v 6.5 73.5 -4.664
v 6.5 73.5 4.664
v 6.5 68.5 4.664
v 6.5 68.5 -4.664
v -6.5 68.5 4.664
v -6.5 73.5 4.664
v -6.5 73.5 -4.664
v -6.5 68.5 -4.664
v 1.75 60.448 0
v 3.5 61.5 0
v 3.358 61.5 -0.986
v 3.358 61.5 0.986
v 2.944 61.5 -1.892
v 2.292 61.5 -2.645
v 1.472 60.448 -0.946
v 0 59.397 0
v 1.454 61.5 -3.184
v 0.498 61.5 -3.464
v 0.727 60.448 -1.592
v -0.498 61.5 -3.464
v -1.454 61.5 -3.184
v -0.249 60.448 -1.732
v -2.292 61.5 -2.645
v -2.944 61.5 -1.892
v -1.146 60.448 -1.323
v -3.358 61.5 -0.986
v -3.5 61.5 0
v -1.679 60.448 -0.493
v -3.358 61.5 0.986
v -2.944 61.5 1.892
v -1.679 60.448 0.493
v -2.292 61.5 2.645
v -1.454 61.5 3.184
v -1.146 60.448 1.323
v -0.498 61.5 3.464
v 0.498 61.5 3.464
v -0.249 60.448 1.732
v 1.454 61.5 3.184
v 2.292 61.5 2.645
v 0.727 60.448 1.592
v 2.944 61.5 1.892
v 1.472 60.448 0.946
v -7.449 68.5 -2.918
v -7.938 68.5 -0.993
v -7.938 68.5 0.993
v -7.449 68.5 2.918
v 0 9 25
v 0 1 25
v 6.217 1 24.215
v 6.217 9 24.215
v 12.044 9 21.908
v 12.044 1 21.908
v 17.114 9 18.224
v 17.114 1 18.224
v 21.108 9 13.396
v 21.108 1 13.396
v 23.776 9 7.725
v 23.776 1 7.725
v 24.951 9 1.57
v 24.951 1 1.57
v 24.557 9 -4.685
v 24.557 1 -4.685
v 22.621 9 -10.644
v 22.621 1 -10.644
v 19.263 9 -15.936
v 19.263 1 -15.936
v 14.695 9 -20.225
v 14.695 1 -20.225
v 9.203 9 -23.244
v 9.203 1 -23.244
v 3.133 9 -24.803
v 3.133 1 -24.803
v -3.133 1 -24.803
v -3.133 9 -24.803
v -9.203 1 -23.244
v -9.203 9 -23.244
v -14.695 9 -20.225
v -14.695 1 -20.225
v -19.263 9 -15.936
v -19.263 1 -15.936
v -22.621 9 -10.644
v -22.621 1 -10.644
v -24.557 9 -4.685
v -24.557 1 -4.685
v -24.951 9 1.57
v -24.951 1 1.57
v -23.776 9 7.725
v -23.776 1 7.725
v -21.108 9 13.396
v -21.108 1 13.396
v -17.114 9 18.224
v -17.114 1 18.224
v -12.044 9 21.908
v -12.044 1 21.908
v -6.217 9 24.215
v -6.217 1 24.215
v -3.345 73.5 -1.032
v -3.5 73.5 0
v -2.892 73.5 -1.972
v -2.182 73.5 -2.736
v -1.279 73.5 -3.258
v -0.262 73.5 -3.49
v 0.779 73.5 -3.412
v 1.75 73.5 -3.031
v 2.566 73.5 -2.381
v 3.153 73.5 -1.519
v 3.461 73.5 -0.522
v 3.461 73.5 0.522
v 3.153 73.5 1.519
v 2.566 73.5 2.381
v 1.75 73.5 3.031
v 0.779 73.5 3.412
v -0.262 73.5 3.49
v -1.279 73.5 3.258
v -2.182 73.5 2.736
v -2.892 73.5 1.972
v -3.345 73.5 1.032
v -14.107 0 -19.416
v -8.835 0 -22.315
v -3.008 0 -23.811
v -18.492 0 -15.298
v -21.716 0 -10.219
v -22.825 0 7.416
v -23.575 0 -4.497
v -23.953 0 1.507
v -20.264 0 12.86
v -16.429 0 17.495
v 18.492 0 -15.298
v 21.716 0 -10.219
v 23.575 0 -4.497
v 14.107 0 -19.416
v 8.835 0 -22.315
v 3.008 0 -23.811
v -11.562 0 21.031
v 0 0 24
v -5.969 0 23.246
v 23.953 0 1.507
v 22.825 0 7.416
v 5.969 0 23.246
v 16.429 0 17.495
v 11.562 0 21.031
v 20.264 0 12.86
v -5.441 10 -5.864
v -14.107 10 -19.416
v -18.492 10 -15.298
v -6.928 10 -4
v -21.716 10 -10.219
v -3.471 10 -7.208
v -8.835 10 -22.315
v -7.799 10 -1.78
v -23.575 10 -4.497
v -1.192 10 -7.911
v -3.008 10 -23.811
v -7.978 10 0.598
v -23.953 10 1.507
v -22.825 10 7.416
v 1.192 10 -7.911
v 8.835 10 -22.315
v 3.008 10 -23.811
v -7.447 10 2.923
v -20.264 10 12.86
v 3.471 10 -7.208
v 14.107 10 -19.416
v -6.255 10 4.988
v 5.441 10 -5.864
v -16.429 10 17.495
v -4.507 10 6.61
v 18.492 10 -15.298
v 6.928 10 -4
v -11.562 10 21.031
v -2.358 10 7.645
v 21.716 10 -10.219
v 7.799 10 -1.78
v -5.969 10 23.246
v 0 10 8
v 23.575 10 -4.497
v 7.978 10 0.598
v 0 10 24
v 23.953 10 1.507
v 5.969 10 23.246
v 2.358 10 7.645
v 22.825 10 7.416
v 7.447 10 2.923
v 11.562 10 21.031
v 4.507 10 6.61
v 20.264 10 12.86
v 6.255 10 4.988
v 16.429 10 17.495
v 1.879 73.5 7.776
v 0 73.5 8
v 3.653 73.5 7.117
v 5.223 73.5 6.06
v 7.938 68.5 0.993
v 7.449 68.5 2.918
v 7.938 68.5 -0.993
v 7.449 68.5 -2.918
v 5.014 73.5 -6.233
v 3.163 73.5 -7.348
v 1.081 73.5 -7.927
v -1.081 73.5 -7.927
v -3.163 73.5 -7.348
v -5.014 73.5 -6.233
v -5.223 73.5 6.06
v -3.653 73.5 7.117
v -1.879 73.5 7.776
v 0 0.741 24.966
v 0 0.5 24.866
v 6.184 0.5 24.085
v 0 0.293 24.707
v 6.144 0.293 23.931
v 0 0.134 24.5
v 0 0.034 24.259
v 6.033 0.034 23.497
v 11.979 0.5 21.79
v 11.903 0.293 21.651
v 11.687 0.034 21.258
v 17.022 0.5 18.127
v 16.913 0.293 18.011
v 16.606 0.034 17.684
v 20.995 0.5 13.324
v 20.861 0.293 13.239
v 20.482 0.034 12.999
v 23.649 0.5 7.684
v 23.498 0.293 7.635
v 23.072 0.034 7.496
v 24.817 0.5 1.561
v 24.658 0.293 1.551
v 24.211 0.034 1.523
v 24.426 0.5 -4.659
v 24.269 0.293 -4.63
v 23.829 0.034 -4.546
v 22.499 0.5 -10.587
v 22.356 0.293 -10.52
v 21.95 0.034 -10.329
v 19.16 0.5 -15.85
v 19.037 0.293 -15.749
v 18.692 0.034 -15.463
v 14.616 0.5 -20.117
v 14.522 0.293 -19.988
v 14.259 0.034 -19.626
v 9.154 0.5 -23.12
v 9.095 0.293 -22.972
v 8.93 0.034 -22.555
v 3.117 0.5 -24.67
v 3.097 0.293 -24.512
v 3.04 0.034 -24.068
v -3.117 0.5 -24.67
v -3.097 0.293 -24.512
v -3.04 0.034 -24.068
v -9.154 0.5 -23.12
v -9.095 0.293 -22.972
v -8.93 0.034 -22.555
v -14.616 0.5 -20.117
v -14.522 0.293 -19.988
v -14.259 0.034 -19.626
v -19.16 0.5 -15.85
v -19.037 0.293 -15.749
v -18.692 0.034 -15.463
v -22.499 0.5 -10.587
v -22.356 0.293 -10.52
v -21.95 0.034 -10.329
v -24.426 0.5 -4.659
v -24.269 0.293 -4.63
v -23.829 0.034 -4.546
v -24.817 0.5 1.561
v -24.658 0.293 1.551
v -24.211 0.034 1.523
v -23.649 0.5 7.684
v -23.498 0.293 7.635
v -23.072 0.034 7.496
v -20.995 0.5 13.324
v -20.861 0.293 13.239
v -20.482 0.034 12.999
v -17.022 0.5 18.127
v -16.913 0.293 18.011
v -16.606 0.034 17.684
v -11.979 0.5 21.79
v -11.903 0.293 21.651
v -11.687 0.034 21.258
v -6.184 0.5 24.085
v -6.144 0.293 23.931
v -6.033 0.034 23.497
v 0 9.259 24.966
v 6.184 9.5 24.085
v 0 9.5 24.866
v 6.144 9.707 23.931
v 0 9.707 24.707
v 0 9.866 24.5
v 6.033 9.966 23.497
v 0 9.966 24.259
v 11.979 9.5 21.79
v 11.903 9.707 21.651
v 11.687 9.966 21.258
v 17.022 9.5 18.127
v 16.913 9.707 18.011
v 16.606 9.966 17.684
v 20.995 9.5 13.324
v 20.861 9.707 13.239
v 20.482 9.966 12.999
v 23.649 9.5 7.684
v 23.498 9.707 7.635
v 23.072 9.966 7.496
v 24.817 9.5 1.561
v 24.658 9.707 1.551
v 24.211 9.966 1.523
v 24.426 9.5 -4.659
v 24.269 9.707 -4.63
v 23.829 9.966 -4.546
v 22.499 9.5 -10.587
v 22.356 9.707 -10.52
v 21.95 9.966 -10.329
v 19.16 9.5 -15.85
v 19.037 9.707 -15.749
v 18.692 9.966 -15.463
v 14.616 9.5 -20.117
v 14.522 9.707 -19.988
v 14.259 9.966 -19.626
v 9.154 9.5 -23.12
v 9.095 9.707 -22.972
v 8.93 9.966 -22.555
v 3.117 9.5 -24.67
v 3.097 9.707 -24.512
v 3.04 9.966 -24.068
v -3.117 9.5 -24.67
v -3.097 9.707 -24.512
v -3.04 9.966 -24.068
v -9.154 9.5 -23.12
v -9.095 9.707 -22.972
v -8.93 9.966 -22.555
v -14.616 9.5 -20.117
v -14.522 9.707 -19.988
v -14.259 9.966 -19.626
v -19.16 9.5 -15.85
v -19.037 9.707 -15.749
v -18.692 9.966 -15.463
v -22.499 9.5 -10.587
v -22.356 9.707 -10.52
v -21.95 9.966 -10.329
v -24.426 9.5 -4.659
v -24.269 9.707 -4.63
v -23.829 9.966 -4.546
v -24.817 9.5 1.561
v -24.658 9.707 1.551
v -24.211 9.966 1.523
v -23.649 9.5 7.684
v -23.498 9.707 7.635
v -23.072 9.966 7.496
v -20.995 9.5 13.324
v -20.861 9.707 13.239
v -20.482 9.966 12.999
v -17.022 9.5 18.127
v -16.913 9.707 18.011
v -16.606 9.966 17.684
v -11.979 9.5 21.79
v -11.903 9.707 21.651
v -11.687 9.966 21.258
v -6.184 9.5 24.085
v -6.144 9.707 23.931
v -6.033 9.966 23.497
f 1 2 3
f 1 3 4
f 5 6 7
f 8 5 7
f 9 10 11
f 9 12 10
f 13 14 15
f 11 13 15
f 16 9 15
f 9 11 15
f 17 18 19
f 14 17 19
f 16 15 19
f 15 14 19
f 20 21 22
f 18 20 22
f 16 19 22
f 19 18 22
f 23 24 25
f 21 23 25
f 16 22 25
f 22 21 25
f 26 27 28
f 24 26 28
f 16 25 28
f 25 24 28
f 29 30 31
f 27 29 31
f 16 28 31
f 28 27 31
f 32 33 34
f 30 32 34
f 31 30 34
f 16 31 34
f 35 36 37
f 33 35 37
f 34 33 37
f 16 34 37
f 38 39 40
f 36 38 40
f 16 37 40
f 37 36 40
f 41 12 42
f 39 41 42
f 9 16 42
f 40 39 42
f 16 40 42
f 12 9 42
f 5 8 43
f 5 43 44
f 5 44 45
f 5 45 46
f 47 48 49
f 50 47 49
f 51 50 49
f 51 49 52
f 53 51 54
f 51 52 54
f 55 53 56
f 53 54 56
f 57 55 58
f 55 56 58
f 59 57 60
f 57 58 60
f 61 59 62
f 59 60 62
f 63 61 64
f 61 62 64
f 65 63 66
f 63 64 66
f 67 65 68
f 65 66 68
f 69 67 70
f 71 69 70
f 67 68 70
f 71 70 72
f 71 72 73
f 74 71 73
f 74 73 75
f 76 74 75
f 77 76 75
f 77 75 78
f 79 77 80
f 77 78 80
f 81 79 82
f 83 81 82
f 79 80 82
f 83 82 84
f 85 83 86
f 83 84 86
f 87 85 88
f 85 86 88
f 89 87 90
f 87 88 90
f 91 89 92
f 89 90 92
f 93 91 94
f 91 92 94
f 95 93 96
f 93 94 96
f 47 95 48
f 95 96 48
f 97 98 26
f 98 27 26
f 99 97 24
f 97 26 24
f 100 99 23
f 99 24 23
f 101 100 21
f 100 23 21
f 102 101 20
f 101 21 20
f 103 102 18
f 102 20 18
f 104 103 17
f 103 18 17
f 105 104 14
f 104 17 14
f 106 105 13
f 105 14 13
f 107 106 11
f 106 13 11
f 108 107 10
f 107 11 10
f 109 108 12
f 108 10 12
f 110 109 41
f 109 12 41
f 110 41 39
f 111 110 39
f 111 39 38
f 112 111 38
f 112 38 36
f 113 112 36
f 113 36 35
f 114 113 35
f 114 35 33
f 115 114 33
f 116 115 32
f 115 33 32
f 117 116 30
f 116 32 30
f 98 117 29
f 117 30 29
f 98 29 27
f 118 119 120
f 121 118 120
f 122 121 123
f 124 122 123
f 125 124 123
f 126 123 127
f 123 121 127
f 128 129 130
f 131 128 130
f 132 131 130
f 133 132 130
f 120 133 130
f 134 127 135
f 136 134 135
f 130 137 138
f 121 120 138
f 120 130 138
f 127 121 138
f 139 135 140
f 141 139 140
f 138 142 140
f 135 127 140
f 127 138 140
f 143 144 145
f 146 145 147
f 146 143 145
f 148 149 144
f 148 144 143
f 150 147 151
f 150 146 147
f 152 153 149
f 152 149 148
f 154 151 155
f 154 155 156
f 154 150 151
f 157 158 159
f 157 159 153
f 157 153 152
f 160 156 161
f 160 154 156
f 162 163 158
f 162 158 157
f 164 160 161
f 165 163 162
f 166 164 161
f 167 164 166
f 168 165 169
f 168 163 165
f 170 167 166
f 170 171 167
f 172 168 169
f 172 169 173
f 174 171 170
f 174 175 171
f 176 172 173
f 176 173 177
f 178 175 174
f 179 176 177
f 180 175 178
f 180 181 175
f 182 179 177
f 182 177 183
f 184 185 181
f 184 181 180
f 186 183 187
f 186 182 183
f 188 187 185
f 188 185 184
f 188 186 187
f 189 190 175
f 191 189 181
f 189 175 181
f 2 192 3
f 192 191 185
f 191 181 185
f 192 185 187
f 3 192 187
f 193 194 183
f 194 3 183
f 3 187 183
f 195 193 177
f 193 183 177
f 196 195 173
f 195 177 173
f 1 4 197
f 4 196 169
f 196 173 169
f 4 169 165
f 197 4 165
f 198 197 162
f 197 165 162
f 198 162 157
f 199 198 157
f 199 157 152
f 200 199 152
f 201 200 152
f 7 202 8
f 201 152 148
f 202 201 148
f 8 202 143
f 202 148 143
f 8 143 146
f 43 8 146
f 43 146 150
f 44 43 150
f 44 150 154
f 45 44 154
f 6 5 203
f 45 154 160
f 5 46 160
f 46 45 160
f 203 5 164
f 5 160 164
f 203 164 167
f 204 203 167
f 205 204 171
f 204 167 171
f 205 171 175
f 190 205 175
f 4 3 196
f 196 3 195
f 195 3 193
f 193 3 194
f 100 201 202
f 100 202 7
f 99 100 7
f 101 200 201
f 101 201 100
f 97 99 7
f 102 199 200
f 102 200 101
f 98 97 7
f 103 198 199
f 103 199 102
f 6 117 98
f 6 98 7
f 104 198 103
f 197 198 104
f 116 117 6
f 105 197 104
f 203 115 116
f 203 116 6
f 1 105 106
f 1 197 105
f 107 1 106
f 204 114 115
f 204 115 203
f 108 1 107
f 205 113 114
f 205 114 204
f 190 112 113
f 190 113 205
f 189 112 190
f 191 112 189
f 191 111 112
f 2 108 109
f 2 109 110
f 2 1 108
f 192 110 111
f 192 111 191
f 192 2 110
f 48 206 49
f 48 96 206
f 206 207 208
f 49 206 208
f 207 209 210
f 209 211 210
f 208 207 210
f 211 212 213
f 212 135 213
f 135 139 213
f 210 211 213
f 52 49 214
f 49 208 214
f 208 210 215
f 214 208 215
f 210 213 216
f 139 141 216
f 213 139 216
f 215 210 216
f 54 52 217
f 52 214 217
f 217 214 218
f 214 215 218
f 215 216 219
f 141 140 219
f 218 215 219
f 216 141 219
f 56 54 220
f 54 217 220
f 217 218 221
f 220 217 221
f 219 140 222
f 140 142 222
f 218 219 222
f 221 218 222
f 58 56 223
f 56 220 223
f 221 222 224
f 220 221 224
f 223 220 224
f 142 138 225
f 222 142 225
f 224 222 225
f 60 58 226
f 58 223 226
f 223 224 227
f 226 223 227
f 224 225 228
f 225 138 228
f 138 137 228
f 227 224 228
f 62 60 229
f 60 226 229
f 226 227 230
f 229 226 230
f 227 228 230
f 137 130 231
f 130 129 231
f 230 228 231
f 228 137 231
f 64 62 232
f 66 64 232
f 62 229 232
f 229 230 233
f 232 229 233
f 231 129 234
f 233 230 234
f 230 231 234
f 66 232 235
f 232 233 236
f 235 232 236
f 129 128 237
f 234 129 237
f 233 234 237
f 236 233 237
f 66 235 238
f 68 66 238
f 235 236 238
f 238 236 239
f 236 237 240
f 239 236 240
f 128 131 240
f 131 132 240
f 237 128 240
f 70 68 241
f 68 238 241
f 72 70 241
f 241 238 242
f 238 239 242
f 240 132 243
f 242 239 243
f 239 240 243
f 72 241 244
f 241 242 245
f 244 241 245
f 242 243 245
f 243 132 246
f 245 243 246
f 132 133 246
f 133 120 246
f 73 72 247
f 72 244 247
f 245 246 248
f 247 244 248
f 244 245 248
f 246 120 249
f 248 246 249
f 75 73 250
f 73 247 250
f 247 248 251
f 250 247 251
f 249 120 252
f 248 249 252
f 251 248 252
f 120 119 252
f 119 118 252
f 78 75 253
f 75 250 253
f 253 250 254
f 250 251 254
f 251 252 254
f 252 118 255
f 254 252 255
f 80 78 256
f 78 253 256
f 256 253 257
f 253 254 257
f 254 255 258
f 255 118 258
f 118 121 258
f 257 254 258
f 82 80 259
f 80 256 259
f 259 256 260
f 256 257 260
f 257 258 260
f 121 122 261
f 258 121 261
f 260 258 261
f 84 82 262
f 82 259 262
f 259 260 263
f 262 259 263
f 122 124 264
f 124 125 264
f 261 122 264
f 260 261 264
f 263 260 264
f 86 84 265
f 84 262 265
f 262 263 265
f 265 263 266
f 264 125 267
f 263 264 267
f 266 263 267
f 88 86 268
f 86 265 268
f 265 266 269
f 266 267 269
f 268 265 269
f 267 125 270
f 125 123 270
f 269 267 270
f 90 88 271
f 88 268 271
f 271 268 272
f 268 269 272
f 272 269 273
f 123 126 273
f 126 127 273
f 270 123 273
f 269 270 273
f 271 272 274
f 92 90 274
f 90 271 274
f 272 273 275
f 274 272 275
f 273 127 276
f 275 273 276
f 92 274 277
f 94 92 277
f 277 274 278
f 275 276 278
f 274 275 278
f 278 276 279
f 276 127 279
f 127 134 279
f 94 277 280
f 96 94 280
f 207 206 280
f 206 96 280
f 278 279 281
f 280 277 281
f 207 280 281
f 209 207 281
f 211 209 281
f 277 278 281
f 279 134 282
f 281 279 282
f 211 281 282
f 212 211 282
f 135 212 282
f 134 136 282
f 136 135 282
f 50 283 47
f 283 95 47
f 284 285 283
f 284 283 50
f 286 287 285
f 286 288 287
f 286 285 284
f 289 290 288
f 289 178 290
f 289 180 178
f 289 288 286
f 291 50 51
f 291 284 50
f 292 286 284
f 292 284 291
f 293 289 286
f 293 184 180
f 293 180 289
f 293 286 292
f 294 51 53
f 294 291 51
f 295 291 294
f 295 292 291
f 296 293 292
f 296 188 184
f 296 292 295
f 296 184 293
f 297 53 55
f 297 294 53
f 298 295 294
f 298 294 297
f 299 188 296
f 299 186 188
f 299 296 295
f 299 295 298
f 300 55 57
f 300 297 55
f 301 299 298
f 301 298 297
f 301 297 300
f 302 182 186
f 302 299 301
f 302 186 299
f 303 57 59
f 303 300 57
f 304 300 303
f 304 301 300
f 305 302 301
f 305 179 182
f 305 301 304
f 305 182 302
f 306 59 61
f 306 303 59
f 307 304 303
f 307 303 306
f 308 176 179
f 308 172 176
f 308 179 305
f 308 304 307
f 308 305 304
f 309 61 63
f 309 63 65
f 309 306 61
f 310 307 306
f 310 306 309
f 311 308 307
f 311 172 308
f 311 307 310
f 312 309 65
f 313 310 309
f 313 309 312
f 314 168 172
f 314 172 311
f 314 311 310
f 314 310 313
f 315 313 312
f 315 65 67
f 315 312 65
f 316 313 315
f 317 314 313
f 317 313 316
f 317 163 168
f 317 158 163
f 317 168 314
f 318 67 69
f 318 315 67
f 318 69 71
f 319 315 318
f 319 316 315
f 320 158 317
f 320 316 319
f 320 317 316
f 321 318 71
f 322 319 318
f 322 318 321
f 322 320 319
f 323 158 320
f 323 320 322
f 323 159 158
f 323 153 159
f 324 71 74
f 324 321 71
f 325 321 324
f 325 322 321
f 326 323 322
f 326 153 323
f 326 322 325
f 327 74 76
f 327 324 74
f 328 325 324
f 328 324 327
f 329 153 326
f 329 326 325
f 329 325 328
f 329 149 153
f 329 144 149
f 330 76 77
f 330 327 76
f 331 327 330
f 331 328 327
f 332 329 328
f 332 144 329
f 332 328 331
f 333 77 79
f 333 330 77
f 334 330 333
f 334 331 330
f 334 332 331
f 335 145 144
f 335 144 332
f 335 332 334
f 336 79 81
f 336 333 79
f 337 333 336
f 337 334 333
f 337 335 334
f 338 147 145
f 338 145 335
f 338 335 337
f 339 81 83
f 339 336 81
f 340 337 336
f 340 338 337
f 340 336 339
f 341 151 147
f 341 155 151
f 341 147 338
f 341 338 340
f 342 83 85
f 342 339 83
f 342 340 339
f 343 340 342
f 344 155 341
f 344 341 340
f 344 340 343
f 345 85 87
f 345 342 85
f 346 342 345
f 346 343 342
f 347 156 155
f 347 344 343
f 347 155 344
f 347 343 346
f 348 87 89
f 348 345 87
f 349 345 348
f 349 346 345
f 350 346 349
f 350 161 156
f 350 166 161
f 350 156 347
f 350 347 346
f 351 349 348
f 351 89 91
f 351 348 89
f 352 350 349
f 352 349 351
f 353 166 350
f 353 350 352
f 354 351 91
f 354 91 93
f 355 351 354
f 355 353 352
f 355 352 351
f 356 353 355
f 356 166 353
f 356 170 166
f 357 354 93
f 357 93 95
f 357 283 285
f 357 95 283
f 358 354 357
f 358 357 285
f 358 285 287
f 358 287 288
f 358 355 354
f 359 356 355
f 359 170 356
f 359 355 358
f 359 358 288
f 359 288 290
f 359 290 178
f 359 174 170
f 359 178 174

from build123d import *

# Parameters (mm, degrees)
SKETCH1_R                 = 25
BOSS_EXTRUDE1_DEPTH       = 10
FILLET1_R                 = 1
SKETCH2_R                 = 8
BOSS_EXTRUDE2_DEPTH       = 63.5
M8X1_0_TAPPED_HOLE1_D     = 7
M8X1_0_TAPPED_HOLE1_DEPTH = 12
M8X1_0_TAPPED_HOLE1_TIP   = 2.103012167
SKETCH5_OUTSIDE_W         = 72.398
SKETCH5_OUTSIDE_H         = 72.398
SKETCH5_OUTSIDE_W_2       = 13
SKETCH5_OUTSIDE_H_2       = 18.1448046
CUT_EXTRUDE1_DEPTH        = 5


with BuildPart() as part:
    # Sketch1 → Boss-Extrude1 (new body)
    with BuildSketch(Plane(origin=(0, 0, 0), x_dir=(1, 0, 0), z_dir=(0, 1, 0))):
        with Locations(Location((0, 0, 0), (0, 0, 270))):
            Circle(SKETCH1_R)
    extrude(amount=BOSS_EXTRUDE1_DEPTH)

    # Fillet1
    fillet1_edges = [part.edges().sort_by_distance(p)[0] for p in [
        (0, 0, -25),
        (0, 10, -25),
    ]]
    fillet(fillet1_edges, radius=FILLET1_R)

    # Sketch2 → Boss-Extrude2 (add)
    with BuildSketch(Plane(origin=(0, 10, 0), x_dir=(1, 0, 0), z_dir=(0, 1, 0))):
        with Locations(Location((0, 0, 0), (0, 0, 270))):
            Circle(SKETCH2_R)
    extrude(amount=BOSS_EXTRUDE2_DEPTH)

    # M8x1.0 Tapped Hole1
    with Locations(Plane(origin=(0, 73.5, 0), x_dir=(1, 0, 0), z_dir=(0, 1, 0))):
        with Locations((0, 0)):
            Hole(M8X1_0_TAPPED_HOLE1_D / 2, depth=M8X1_0_TAPPED_HOLE1_DEPTH)
            with Locations((0, 0, -(M8X1_0_TAPPED_HOLE1_DEPTH + M8X1_0_TAPPED_HOLE1_TIP / 2))):  # 118° drill point
                Cone(0, M8X1_0_TAPPED_HOLE1_D / 2, M8X1_0_TAPPED_HOLE1_TIP, mode=Mode.SUBTRACT)

    # Sketch5 outside → Cut-Extrude1 (cut)
    with BuildSketch(Plane(origin=(0, 73.5, 0), x_dir=(1, 0, 0), z_dir=(0, 1, 0))):
        Rectangle(SKETCH5_OUTSIDE_W, SKETCH5_OUTSIDE_H)
        Rectangle(SKETCH5_OUTSIDE_W_2, SKETCH5_OUTSIDE_H_2, mode=Mode.SUBTRACT)
    extrude(amount=-CUT_EXTRUDE1_DEPTH, mode=Mode.SUBTRACT)


solid = part.part
